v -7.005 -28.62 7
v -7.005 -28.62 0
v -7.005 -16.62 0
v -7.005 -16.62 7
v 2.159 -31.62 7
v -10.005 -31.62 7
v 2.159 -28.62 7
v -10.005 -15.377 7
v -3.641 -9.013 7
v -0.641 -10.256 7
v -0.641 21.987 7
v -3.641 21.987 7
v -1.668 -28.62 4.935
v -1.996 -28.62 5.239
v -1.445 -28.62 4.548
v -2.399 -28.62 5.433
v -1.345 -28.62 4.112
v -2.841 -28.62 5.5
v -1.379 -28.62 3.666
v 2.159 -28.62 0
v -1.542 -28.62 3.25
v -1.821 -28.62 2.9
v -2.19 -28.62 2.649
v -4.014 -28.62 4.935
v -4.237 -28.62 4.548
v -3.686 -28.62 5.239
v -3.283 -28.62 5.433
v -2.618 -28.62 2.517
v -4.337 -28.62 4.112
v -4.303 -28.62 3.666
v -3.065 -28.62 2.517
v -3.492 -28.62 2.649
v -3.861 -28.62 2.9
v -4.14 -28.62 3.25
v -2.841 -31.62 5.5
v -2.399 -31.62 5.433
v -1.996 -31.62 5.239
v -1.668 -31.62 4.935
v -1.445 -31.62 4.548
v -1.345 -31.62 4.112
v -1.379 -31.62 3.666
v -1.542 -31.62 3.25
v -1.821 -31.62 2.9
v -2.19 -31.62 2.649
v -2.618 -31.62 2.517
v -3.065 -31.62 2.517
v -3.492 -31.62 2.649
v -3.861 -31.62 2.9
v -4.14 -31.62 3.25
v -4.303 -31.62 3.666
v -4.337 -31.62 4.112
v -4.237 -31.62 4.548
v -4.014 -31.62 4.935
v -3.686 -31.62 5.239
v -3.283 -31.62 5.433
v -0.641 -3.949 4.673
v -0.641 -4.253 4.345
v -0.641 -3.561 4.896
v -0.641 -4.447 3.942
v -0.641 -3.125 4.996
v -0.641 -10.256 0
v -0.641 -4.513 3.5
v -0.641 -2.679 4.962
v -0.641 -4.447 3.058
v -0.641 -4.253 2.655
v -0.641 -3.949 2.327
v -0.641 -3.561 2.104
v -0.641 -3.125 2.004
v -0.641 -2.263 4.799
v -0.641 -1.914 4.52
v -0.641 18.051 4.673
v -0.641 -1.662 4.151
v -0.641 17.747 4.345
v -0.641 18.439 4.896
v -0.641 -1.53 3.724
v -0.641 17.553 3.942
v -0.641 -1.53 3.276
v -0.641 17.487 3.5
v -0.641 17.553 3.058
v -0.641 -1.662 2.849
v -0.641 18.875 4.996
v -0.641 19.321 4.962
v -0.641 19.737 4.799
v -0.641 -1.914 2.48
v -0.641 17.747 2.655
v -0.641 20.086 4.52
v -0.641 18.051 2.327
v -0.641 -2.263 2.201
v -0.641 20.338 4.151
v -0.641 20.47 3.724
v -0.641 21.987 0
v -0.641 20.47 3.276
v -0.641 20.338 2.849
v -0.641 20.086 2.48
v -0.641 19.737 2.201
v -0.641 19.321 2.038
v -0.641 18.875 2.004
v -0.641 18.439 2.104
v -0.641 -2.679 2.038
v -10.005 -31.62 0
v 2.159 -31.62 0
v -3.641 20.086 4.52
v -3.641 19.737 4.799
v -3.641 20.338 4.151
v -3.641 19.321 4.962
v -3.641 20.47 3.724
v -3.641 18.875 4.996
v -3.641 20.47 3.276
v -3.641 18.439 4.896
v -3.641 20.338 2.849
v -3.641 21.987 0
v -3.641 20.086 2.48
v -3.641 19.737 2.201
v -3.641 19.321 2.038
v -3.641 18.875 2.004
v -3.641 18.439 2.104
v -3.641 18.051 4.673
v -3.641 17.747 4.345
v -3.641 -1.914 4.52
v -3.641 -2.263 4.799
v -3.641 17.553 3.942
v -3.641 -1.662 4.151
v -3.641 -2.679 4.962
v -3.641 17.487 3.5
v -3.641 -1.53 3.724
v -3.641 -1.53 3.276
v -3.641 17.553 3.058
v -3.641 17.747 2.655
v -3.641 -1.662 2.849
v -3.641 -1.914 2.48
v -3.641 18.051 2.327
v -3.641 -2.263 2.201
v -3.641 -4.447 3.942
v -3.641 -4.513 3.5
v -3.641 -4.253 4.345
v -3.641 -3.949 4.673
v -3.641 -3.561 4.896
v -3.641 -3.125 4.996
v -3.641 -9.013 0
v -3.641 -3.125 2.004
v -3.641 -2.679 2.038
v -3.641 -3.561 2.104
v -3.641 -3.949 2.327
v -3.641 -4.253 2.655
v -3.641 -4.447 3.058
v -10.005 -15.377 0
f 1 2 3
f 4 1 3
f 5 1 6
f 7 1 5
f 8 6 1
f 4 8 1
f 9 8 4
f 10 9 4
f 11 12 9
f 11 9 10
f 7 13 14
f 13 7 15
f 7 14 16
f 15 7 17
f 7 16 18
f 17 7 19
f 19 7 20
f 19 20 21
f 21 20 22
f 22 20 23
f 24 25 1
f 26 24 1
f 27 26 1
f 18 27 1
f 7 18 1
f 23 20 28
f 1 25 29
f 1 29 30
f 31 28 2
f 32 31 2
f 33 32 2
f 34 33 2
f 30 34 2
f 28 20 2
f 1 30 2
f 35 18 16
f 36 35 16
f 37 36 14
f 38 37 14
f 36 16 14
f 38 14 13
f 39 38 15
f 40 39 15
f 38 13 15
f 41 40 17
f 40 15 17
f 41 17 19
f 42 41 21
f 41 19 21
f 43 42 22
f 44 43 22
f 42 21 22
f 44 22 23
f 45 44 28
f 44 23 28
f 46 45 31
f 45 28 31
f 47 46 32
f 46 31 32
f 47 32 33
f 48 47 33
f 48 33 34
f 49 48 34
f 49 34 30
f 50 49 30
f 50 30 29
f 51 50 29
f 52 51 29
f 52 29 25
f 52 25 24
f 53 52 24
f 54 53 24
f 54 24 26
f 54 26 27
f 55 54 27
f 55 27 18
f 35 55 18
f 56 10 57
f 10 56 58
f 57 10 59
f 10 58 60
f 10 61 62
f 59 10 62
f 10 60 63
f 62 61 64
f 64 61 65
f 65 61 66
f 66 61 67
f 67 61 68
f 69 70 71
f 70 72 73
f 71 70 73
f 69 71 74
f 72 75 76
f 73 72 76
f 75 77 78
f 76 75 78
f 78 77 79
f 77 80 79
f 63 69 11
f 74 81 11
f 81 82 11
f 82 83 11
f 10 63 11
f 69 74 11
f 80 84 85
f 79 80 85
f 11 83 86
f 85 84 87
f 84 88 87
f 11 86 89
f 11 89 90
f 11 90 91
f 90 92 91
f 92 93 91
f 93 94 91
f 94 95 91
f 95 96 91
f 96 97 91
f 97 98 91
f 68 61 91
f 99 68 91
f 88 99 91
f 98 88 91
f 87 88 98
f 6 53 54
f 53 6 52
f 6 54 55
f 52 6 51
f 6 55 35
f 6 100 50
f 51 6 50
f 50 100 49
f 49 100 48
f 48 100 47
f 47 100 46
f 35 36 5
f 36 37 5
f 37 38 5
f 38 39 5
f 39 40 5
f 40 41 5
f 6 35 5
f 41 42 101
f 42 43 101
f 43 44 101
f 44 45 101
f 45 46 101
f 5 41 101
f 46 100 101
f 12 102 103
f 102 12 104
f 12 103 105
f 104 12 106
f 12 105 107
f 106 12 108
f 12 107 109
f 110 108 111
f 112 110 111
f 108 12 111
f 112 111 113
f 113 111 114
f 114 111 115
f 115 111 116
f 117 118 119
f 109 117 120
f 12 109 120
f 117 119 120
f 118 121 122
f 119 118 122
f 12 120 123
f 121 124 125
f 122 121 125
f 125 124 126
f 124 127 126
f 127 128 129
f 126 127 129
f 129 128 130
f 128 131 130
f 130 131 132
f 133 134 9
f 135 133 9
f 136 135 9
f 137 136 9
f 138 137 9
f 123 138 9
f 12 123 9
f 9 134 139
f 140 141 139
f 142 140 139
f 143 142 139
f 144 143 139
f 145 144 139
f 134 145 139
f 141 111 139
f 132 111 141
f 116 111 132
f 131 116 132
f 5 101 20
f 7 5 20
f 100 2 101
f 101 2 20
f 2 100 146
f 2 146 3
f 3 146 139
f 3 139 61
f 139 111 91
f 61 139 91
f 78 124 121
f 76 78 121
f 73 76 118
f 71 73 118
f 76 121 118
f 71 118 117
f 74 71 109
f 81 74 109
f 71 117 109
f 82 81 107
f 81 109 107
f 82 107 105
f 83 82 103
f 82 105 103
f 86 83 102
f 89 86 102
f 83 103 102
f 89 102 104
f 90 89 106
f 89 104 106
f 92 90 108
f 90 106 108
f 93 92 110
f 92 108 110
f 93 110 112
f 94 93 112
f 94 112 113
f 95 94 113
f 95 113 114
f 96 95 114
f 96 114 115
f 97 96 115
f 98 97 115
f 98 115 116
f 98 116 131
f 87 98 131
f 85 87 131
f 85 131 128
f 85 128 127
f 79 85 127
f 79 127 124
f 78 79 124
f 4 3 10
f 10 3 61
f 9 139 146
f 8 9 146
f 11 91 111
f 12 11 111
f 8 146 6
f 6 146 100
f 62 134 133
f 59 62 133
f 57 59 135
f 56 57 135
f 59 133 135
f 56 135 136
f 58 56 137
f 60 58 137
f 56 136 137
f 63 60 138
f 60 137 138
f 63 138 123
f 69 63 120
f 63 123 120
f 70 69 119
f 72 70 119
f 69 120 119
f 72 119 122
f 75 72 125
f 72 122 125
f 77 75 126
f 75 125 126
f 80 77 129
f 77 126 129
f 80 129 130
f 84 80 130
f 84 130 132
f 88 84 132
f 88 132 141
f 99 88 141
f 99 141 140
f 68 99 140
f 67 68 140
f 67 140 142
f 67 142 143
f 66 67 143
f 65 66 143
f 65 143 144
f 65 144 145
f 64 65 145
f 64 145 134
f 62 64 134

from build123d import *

# Parameters (mm, degrees)
SKETCH_1_W          = 1.5
SKETCH_1_H          = 3
SKETCH_1_W_2        = 3.5
EXTRUDE_1_DEPTH     = 7
SKETCH_2_R          = 1.5
CUT_EXTRUDE_2_DEPTH = 7
SKETCH_4_R          = 1.5
CUT_EXTRUDE_3_DEPTH = 7


with BuildPart() as part:
    # 草图1 → 凸台-拉伸1 (new body)
    with BuildSketch(Plane.XY):
        Polygon((-0.641080243, 21.986723194), (-3.641080243, 21.986723194), (-3.641080243, -9.013276806), (-10.005041274, -15.377237837), (-10.005041274, -31.619878524), (-4.341080243, -31.619878524), (-4.341080243, -28.619878524), (-7.005041274, -28.619878524), (-7.005041274, -16.619878524), (-0.641080243, -10.255917493), align=None)
        with Locations((-2.091080243, -30.119878524)):
            Rectangle(SKETCH_1_W, SKETCH_1_H)
        with Locations((-3.591080243, -30.119878524)):
            Rectangle(SKETCH_1_W, SKETCH_1_H)
        with Locations((0.408919757, -30.119878524)):
            Rectangle(SKETCH_1_W_2, SKETCH_1_H)
    extrude(amount=EXTRUDE_1_DEPTH)

    # 草图2 → 切除-拉伸2 (cut)
    with BuildSketch(Plane.ZY.offset(3.641080243)):
        with Locations(Location((3.5, 18.986723194, 0), (0, 0, 270))):
            Circle(SKETCH_2_R)
        with Locations(Location((3.5, -3.013276806, 0), (0, 0, 270))):
            Circle(SKETCH_2_R)
    extrude(amount=-CUT_EXTRUDE_2_DEPTH, mode=Mode.SUBTRACT)

    # 草图4 → 切除-拉伸3 (cut)
    with BuildSketch(Plane(origin=(0, -28.619878524, 0), x_dir=(1, 0, 0), z_dir=(0, 1, 0))):
        with Locations(Location((-2.841080243, -4, 0), (0, 0, 270))):
            Circle(SKETCH_4_R)
    extrude(amount=-CUT_EXTRUDE_3_DEPTH, mode=Mode.SUBTRACT)


solid = part.part
